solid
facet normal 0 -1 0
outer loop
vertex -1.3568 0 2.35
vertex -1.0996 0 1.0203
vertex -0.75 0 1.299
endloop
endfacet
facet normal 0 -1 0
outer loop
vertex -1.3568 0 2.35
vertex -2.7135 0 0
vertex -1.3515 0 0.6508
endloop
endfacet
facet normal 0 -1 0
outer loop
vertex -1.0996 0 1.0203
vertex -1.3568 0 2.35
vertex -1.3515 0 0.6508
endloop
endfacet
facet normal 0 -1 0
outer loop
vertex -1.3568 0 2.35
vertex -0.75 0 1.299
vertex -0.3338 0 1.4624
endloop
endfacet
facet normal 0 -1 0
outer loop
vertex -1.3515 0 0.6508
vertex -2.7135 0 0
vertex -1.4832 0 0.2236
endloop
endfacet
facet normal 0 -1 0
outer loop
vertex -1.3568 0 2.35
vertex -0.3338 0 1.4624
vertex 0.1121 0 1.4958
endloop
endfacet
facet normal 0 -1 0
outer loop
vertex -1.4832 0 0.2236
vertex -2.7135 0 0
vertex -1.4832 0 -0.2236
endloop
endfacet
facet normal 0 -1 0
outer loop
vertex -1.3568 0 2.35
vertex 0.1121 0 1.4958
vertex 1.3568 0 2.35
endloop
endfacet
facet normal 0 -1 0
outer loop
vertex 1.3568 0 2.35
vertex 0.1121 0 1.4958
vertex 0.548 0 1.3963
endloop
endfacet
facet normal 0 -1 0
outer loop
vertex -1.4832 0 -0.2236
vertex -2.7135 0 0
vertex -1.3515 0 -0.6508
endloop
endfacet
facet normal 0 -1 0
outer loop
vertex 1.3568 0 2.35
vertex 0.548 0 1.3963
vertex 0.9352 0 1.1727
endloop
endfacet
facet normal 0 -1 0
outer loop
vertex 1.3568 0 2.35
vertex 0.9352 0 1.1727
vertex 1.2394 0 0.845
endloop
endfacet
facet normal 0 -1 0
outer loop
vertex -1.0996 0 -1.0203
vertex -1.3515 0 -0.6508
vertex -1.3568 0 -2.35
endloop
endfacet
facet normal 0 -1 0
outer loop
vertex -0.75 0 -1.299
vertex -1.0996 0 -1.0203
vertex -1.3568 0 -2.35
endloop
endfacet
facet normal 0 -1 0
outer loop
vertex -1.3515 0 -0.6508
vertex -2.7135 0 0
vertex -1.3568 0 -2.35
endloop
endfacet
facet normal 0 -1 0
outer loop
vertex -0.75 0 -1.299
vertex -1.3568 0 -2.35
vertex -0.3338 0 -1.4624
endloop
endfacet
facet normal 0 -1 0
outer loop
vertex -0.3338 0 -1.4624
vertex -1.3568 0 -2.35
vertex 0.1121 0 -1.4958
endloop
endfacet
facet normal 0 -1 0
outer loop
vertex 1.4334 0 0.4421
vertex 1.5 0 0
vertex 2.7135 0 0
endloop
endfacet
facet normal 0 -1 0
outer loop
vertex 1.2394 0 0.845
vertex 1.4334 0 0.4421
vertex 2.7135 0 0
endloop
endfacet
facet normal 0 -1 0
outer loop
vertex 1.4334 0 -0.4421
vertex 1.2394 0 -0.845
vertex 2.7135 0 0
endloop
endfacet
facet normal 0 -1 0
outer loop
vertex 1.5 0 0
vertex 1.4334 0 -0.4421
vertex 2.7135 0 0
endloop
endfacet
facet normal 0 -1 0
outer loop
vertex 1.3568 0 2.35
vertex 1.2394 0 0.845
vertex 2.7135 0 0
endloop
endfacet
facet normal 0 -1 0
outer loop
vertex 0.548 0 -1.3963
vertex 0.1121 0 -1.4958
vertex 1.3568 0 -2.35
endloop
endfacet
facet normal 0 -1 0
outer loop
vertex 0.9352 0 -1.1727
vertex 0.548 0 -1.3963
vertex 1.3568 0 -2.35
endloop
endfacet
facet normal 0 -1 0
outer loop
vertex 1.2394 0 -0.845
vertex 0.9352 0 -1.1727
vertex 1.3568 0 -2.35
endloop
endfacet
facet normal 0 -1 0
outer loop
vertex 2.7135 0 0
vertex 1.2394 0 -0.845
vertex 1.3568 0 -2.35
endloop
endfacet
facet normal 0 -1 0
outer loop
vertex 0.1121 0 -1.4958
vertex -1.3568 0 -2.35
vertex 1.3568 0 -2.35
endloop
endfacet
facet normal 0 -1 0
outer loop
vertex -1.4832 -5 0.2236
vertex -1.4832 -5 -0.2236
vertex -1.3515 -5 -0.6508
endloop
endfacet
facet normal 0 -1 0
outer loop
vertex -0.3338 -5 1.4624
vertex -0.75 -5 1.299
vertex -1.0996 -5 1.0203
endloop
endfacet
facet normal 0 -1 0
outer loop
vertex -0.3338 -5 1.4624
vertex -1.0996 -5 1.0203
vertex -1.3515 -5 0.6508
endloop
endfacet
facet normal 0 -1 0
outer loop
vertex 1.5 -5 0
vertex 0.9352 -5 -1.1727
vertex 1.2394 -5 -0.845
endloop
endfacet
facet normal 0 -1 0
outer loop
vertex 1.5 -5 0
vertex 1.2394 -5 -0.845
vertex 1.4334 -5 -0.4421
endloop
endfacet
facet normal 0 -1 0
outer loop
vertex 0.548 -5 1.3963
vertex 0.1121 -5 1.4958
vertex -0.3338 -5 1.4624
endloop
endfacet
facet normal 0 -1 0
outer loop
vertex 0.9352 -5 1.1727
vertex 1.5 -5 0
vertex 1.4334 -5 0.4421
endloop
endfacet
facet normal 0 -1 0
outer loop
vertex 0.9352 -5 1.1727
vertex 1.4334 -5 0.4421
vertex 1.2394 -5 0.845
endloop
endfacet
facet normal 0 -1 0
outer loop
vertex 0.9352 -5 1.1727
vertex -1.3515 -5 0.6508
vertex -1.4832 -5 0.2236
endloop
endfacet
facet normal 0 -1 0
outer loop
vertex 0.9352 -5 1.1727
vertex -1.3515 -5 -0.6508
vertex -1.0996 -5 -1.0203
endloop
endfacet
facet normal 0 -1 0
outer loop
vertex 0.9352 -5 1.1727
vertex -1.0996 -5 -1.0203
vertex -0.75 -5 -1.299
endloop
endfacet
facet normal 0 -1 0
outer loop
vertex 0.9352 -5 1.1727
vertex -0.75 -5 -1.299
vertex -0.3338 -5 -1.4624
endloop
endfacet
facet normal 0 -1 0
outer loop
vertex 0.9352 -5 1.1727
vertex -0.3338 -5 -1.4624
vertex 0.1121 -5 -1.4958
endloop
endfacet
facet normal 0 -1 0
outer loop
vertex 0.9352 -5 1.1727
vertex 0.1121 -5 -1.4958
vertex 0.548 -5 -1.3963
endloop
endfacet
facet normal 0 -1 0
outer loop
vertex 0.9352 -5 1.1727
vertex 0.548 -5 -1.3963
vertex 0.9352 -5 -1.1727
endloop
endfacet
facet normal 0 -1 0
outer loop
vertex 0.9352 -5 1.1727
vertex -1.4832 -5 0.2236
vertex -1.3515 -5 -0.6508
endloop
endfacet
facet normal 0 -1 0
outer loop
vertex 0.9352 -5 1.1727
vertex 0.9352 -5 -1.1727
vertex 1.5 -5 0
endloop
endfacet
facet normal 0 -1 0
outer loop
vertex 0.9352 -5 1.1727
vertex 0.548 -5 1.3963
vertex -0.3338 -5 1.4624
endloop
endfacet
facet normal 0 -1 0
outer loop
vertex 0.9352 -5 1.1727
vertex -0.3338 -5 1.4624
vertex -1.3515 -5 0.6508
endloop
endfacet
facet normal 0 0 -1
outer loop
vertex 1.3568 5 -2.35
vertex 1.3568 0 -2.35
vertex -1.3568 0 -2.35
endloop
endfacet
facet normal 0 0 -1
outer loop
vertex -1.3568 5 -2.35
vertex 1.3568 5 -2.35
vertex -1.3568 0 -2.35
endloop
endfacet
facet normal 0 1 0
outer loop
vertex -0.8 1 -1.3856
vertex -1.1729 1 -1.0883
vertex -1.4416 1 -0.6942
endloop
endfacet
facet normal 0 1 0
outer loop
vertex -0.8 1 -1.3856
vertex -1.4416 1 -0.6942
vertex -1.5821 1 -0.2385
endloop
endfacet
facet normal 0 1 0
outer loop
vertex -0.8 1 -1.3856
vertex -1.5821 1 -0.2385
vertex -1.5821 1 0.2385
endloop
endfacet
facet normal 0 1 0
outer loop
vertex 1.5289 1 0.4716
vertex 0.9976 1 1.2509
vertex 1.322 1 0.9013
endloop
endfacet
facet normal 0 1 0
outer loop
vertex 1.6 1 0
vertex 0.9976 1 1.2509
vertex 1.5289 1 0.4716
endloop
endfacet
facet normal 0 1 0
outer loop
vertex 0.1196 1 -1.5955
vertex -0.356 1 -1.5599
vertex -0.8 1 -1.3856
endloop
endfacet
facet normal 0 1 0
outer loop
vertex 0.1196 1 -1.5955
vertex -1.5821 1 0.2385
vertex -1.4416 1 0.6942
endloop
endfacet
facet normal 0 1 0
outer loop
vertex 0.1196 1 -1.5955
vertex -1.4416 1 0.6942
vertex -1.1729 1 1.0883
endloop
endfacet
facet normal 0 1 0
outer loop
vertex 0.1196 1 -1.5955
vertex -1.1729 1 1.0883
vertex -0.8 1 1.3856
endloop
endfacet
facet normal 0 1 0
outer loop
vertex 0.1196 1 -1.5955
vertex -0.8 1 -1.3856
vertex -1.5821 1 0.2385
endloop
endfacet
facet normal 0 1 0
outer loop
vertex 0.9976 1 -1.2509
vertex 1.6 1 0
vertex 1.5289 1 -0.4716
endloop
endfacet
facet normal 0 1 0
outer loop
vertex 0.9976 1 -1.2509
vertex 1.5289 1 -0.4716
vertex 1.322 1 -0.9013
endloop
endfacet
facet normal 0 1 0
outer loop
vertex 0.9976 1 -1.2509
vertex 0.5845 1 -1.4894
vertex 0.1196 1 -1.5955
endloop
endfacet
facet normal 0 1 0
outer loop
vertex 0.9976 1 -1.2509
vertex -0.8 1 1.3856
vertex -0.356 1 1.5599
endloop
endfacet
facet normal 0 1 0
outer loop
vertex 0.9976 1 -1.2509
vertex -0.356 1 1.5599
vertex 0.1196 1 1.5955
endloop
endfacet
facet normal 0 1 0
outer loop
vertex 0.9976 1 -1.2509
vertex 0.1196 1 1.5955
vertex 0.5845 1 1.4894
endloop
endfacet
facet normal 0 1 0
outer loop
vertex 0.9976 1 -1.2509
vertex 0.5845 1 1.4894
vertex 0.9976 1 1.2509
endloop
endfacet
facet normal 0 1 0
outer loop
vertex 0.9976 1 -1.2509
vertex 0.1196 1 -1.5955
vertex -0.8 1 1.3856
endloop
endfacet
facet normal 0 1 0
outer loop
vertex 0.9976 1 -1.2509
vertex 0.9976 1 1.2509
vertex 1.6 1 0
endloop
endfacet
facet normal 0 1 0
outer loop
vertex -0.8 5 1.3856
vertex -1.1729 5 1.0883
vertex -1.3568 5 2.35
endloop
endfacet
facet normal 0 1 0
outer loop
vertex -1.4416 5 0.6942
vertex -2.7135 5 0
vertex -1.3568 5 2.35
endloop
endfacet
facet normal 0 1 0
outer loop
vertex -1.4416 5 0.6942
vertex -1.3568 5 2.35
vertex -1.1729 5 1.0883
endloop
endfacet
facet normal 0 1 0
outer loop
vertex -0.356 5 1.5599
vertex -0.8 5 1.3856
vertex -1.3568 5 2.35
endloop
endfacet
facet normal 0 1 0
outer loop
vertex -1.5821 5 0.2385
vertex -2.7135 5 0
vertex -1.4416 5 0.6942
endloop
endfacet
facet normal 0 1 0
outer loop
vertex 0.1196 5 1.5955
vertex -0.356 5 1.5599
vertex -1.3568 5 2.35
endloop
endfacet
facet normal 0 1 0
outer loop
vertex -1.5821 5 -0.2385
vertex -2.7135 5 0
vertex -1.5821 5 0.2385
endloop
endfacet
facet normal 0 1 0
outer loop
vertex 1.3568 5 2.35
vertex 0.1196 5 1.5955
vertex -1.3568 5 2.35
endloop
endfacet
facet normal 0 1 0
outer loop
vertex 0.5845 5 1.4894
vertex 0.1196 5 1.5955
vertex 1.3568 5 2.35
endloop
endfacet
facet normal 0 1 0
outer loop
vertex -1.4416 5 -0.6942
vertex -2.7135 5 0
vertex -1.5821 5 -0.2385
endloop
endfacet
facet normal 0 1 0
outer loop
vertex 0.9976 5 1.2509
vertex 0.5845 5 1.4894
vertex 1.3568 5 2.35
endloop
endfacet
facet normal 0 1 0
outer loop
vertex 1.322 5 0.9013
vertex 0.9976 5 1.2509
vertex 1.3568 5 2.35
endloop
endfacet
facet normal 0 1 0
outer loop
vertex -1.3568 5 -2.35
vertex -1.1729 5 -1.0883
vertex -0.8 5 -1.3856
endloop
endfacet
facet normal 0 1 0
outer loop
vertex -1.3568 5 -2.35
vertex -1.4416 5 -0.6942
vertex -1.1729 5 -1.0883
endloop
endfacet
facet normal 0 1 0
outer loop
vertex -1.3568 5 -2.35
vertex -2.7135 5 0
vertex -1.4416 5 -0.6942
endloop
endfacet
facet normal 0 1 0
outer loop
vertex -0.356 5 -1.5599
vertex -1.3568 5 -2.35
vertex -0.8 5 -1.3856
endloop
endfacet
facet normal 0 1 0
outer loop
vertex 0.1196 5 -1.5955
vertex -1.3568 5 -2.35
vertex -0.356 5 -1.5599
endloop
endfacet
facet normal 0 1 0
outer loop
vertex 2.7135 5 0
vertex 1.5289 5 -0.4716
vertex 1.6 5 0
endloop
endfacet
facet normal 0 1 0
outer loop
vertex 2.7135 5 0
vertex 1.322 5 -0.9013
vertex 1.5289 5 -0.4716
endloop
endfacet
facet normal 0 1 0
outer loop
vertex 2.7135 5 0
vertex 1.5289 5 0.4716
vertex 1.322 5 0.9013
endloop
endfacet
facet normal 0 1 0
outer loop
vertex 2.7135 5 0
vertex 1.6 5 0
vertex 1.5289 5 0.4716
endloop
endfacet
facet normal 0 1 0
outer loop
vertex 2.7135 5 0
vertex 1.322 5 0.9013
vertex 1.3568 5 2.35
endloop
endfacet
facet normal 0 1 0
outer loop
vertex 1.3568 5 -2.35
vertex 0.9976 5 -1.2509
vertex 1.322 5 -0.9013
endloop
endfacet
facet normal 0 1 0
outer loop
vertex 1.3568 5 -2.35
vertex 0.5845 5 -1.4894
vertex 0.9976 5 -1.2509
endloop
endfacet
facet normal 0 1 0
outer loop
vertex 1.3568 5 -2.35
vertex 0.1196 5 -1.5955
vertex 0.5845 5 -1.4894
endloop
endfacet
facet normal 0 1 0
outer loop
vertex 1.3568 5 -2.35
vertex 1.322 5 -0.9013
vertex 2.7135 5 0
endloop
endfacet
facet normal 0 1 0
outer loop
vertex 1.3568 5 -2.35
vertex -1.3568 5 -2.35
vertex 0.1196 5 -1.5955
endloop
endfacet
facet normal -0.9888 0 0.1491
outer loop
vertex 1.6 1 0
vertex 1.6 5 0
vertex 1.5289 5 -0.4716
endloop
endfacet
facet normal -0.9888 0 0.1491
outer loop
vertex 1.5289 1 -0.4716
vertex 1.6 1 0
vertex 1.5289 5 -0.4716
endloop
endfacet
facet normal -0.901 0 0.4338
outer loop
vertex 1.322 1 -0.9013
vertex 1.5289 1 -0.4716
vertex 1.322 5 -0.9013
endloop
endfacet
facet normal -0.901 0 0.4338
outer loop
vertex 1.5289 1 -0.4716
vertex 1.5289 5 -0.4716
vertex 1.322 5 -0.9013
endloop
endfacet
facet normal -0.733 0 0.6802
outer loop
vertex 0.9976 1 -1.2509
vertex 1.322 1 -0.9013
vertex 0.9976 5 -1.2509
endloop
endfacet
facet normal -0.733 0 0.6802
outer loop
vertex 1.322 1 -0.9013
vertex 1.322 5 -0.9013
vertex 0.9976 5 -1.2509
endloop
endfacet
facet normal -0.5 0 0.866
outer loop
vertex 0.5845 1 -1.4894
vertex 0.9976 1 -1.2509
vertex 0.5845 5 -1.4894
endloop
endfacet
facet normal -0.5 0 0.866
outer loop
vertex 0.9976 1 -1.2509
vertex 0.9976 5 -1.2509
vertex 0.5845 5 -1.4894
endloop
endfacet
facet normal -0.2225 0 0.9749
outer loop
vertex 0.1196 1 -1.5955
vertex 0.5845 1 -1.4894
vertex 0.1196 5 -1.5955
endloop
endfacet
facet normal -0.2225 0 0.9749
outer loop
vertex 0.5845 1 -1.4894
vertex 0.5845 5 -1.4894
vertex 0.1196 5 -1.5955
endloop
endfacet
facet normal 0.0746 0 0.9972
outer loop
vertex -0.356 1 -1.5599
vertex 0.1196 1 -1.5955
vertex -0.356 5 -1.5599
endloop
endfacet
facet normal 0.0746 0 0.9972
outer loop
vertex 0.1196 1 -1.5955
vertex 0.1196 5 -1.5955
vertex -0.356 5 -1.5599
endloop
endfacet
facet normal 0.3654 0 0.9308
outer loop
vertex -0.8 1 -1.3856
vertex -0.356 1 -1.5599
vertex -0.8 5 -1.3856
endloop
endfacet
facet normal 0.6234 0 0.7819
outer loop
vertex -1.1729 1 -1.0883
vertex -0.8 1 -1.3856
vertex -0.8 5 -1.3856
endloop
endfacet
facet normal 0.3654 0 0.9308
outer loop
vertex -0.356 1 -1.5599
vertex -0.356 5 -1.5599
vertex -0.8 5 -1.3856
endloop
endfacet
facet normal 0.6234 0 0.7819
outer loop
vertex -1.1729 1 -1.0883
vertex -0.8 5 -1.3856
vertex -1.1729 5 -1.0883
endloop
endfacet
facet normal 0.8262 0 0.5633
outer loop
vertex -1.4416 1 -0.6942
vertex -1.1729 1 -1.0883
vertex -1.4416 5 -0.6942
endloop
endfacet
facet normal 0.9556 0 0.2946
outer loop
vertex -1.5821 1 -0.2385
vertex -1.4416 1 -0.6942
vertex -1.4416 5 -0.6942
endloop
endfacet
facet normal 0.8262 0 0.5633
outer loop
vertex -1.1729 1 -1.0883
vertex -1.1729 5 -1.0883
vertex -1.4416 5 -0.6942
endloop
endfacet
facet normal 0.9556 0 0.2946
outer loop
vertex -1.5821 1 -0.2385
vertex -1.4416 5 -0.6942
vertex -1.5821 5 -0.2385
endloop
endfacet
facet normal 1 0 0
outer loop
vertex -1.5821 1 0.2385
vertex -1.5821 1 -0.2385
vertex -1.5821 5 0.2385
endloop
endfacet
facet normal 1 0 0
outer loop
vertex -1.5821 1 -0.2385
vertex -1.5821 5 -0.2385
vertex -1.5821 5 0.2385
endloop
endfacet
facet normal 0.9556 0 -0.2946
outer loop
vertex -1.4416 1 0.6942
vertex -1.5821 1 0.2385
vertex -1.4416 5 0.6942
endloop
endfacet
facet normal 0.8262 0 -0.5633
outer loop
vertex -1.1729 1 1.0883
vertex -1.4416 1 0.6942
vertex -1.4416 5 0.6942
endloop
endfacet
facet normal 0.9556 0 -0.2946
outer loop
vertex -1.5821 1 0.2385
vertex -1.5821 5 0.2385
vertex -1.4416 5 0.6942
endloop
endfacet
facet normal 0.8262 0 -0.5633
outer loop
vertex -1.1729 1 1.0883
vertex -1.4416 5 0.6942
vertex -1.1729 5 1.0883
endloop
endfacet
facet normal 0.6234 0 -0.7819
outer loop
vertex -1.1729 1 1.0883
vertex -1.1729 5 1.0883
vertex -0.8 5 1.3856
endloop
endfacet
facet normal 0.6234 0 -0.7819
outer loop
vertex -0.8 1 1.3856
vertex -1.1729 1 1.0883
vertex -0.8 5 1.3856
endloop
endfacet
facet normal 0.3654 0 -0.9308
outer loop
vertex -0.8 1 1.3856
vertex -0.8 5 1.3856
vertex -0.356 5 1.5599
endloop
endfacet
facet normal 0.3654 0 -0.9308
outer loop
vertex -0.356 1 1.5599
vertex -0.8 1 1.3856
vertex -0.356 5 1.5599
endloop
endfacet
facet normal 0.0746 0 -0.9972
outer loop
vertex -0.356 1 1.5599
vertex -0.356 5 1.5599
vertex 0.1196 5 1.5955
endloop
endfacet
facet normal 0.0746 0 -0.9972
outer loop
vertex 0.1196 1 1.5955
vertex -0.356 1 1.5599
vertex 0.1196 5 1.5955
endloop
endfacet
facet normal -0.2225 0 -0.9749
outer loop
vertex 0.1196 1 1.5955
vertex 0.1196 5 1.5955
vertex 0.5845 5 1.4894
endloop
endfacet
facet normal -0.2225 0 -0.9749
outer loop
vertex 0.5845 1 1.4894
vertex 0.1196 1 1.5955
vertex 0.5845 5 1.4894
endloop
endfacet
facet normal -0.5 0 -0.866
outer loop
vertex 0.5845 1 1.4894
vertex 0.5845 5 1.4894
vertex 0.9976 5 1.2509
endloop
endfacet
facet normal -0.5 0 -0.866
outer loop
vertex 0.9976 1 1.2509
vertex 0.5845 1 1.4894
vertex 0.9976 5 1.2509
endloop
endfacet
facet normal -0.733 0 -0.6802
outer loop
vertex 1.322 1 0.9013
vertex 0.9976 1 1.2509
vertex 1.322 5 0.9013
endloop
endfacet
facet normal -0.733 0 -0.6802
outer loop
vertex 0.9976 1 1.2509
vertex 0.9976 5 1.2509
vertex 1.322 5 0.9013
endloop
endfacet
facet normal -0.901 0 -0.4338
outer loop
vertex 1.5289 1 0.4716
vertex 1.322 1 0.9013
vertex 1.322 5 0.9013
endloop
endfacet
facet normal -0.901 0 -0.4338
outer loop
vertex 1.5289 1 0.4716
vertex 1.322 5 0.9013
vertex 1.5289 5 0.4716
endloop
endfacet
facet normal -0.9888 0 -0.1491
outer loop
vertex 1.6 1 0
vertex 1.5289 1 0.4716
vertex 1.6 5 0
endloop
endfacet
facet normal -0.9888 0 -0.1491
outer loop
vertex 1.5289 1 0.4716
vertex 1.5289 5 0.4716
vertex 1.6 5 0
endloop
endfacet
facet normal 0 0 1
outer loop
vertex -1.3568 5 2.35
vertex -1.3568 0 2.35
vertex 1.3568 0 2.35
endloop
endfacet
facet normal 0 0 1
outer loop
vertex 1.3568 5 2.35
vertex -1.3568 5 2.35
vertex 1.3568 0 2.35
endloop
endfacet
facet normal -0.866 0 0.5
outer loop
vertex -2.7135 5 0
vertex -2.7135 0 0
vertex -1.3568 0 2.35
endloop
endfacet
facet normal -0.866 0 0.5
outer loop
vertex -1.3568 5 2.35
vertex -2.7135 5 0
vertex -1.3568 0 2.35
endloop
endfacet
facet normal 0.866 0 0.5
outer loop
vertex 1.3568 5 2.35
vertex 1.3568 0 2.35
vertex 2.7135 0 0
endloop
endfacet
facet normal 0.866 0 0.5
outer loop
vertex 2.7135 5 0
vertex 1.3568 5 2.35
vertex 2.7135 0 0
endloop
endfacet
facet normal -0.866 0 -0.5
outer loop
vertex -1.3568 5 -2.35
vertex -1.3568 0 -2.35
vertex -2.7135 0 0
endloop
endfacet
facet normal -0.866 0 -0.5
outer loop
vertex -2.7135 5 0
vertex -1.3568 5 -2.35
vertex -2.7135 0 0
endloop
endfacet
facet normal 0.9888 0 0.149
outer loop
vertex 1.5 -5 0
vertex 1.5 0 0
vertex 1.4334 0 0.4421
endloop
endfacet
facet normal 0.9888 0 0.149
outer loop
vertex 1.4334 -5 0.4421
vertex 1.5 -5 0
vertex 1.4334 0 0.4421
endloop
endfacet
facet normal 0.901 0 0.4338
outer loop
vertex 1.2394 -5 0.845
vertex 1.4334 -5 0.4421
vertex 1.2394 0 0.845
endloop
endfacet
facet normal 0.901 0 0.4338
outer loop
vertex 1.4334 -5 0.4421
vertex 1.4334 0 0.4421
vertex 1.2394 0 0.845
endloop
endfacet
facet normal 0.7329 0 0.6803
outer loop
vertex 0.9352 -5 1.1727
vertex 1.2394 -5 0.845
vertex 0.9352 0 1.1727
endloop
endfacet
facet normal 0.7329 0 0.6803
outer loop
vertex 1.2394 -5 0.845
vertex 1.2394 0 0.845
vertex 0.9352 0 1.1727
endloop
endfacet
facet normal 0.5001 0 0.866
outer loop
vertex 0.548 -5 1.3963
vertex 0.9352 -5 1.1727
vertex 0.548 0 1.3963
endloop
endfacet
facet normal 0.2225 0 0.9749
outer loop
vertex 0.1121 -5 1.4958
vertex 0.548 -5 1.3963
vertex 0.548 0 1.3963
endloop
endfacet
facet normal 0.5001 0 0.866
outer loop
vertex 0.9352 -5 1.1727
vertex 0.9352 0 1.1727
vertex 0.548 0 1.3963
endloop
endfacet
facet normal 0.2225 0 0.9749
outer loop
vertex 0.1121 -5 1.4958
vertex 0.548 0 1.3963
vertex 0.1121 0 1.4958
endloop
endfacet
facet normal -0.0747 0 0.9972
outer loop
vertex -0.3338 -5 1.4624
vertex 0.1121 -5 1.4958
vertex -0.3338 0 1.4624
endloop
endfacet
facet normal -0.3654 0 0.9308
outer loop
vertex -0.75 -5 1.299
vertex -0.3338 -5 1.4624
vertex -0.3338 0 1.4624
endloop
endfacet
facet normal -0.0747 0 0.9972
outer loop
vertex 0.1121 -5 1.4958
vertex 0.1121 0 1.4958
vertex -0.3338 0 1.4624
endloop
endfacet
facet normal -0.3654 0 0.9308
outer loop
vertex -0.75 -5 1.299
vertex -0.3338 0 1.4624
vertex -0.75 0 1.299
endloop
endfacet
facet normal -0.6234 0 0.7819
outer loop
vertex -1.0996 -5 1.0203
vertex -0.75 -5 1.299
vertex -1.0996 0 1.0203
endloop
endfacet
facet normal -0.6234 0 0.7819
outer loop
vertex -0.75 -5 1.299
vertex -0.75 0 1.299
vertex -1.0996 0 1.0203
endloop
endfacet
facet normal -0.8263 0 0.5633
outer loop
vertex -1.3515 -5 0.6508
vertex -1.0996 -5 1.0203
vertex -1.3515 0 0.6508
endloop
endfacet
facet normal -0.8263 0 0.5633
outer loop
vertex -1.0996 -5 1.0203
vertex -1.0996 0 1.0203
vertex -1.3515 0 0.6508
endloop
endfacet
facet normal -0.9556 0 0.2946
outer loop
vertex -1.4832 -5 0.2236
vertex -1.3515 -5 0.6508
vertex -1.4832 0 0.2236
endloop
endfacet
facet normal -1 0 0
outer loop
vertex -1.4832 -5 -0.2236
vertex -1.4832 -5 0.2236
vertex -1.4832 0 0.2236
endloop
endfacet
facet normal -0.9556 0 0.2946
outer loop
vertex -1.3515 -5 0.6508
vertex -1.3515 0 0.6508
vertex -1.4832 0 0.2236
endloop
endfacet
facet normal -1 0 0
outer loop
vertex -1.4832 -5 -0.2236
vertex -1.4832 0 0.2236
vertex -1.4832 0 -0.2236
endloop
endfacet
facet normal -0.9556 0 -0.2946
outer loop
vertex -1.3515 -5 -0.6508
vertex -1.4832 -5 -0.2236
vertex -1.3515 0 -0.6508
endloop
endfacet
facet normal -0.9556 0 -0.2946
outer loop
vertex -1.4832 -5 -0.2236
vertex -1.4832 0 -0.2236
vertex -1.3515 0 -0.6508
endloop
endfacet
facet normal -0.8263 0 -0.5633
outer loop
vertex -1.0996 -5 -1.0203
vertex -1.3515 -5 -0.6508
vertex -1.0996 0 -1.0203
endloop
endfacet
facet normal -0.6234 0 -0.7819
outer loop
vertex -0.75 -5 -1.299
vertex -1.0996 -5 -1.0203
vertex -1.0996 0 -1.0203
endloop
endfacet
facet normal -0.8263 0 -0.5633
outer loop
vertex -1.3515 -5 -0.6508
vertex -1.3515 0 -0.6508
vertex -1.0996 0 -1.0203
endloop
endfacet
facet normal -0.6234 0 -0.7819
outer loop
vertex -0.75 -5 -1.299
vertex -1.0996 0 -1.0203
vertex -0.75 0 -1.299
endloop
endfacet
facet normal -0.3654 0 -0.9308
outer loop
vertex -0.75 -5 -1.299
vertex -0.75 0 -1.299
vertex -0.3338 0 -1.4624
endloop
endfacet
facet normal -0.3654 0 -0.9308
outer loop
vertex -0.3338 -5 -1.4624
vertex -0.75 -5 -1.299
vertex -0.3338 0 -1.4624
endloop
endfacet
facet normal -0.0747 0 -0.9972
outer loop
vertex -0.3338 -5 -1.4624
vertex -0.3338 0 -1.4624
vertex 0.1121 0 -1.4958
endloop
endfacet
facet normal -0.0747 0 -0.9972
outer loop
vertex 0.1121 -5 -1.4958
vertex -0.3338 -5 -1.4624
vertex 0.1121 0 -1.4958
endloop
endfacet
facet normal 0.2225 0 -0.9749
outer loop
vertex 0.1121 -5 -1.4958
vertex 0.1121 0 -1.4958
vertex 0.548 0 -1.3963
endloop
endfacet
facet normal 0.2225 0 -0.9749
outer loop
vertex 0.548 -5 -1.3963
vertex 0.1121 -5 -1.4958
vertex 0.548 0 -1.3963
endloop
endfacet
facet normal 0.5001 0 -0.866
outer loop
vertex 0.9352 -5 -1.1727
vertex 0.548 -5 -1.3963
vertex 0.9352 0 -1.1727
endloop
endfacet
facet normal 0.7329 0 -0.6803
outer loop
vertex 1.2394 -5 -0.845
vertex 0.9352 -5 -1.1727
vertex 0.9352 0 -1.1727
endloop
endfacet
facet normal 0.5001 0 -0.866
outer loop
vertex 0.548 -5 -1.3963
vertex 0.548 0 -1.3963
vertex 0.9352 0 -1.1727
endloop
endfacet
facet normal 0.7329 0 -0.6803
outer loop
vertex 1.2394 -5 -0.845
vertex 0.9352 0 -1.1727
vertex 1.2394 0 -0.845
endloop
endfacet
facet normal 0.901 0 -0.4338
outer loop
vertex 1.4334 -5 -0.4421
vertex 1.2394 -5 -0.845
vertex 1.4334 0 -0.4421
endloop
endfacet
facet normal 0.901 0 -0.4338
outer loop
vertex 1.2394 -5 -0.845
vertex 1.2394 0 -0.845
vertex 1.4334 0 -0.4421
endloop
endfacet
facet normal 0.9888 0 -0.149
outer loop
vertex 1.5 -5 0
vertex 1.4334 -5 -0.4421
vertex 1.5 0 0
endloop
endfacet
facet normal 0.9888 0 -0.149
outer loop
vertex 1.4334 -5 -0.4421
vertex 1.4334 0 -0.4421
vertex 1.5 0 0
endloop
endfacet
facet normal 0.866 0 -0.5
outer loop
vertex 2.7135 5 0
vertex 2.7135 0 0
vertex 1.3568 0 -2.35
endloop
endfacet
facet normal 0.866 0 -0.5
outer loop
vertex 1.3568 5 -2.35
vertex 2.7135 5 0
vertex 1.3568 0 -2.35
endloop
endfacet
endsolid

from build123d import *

# Parameters (mm, degrees)
EXTRUDE_1_DEPTH     = 5
SKETCH_2_R          = 1.6
CUT_EXTRUDE_1_DEPTH = 4
SKETCH_3_R          = 1.5
EXTRUDE_2_DEPTH     = 5


with BuildPart() as part:
    # 草图1 → 凸台-拉伸1 (new body)
    with BuildSketch(Plane(origin=(0, 0, 0), x_dir=(1, 0, 0), z_dir=(0, 1, 0))):
        Polygon((2.713546265, 0), (1.356773133, 2.35), (-1.356773133, 2.35), (-2.713546265, 0), (-1.356773133, -2.35), (1.356773133, -2.35), align=None)
    extrude(amount=EXTRUDE_1_DEPTH)

    # 草图2 → 切除-拉伸1 (cut)
    with BuildSketch(Plane(origin=(0, 5, 0), x_dir=(1, 0, 0), z_dir=(0, 1, 0))):
        Circle(SKETCH_2_R)
    extrude(amount=-CUT_EXTRUDE_1_DEPTH, mode=Mode.SUBTRACT)

    # 草图3 → 凸台-拉伸2 (add)
    with BuildSketch(Plane.XZ):
        Circle(SKETCH_3_R)
    extrude(amount=EXTRUDE_2_DEPTH)


solid = part.part
